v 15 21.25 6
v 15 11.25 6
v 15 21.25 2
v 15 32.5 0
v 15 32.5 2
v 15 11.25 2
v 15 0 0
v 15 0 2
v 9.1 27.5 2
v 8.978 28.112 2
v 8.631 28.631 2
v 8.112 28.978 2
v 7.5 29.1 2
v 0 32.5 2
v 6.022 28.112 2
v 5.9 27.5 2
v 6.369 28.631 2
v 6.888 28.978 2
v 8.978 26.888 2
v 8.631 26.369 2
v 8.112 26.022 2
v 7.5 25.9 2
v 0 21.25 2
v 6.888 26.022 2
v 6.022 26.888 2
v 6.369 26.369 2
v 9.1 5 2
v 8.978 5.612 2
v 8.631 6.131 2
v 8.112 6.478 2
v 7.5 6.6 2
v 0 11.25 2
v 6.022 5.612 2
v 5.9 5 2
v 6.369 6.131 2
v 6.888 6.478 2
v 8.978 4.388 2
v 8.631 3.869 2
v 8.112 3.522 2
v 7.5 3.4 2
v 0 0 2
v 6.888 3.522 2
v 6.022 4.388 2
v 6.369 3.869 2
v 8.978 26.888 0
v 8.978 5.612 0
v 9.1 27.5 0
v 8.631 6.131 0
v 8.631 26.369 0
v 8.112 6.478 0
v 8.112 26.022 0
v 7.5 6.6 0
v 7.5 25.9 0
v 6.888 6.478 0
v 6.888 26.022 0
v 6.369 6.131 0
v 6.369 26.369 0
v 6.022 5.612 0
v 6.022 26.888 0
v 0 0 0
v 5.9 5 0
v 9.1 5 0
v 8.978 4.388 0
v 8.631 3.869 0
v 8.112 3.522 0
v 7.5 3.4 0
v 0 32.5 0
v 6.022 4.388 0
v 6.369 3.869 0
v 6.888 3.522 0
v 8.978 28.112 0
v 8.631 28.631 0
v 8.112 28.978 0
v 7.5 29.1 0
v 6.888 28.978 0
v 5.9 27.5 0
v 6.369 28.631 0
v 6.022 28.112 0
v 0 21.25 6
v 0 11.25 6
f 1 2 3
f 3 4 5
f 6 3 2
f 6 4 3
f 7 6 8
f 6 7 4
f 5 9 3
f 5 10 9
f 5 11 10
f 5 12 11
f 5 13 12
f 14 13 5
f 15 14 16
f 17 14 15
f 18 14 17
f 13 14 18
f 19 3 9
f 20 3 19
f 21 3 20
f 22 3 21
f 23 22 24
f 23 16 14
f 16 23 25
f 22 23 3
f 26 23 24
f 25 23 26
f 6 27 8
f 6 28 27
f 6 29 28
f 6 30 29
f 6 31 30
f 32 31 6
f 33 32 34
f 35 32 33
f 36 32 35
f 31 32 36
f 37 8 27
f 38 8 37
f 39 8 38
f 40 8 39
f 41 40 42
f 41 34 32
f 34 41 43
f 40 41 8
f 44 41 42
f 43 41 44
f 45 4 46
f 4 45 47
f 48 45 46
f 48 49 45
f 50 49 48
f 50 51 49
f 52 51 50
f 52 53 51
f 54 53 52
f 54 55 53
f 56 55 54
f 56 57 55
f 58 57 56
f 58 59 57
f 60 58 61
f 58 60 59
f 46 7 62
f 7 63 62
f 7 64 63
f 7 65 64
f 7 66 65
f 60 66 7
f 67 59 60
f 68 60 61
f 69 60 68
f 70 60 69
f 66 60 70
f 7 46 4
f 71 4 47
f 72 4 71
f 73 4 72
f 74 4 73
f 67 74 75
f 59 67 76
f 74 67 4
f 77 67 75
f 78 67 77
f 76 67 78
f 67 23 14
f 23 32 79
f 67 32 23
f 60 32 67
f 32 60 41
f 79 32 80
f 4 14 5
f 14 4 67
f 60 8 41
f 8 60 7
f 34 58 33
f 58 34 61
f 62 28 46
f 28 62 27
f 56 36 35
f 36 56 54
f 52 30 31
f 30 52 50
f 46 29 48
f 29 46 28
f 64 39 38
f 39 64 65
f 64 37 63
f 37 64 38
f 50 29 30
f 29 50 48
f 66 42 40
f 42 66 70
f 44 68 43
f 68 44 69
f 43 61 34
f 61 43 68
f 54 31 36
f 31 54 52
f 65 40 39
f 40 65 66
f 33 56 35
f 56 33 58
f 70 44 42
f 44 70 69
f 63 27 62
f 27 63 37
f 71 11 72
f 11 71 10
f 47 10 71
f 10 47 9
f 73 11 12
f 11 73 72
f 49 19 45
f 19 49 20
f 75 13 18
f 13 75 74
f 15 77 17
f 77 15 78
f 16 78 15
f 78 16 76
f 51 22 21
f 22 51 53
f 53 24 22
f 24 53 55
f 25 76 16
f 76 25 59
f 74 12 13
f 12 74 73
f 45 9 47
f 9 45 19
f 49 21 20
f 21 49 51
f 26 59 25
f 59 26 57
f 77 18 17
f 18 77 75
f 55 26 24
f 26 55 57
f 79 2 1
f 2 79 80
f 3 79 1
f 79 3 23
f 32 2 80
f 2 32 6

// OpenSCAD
difference() {   
  cube([15, 32.5, 2]);
  translate([7.5,5,-1]) cylinder(d=3.2, h=20, $fn=16);
  translate([7.5,27.5,-1]) cylinder(d=3.2, h=20, $fn=16);
}

translate([0, 11.25, 2]) cube([15, 10, 4]);
